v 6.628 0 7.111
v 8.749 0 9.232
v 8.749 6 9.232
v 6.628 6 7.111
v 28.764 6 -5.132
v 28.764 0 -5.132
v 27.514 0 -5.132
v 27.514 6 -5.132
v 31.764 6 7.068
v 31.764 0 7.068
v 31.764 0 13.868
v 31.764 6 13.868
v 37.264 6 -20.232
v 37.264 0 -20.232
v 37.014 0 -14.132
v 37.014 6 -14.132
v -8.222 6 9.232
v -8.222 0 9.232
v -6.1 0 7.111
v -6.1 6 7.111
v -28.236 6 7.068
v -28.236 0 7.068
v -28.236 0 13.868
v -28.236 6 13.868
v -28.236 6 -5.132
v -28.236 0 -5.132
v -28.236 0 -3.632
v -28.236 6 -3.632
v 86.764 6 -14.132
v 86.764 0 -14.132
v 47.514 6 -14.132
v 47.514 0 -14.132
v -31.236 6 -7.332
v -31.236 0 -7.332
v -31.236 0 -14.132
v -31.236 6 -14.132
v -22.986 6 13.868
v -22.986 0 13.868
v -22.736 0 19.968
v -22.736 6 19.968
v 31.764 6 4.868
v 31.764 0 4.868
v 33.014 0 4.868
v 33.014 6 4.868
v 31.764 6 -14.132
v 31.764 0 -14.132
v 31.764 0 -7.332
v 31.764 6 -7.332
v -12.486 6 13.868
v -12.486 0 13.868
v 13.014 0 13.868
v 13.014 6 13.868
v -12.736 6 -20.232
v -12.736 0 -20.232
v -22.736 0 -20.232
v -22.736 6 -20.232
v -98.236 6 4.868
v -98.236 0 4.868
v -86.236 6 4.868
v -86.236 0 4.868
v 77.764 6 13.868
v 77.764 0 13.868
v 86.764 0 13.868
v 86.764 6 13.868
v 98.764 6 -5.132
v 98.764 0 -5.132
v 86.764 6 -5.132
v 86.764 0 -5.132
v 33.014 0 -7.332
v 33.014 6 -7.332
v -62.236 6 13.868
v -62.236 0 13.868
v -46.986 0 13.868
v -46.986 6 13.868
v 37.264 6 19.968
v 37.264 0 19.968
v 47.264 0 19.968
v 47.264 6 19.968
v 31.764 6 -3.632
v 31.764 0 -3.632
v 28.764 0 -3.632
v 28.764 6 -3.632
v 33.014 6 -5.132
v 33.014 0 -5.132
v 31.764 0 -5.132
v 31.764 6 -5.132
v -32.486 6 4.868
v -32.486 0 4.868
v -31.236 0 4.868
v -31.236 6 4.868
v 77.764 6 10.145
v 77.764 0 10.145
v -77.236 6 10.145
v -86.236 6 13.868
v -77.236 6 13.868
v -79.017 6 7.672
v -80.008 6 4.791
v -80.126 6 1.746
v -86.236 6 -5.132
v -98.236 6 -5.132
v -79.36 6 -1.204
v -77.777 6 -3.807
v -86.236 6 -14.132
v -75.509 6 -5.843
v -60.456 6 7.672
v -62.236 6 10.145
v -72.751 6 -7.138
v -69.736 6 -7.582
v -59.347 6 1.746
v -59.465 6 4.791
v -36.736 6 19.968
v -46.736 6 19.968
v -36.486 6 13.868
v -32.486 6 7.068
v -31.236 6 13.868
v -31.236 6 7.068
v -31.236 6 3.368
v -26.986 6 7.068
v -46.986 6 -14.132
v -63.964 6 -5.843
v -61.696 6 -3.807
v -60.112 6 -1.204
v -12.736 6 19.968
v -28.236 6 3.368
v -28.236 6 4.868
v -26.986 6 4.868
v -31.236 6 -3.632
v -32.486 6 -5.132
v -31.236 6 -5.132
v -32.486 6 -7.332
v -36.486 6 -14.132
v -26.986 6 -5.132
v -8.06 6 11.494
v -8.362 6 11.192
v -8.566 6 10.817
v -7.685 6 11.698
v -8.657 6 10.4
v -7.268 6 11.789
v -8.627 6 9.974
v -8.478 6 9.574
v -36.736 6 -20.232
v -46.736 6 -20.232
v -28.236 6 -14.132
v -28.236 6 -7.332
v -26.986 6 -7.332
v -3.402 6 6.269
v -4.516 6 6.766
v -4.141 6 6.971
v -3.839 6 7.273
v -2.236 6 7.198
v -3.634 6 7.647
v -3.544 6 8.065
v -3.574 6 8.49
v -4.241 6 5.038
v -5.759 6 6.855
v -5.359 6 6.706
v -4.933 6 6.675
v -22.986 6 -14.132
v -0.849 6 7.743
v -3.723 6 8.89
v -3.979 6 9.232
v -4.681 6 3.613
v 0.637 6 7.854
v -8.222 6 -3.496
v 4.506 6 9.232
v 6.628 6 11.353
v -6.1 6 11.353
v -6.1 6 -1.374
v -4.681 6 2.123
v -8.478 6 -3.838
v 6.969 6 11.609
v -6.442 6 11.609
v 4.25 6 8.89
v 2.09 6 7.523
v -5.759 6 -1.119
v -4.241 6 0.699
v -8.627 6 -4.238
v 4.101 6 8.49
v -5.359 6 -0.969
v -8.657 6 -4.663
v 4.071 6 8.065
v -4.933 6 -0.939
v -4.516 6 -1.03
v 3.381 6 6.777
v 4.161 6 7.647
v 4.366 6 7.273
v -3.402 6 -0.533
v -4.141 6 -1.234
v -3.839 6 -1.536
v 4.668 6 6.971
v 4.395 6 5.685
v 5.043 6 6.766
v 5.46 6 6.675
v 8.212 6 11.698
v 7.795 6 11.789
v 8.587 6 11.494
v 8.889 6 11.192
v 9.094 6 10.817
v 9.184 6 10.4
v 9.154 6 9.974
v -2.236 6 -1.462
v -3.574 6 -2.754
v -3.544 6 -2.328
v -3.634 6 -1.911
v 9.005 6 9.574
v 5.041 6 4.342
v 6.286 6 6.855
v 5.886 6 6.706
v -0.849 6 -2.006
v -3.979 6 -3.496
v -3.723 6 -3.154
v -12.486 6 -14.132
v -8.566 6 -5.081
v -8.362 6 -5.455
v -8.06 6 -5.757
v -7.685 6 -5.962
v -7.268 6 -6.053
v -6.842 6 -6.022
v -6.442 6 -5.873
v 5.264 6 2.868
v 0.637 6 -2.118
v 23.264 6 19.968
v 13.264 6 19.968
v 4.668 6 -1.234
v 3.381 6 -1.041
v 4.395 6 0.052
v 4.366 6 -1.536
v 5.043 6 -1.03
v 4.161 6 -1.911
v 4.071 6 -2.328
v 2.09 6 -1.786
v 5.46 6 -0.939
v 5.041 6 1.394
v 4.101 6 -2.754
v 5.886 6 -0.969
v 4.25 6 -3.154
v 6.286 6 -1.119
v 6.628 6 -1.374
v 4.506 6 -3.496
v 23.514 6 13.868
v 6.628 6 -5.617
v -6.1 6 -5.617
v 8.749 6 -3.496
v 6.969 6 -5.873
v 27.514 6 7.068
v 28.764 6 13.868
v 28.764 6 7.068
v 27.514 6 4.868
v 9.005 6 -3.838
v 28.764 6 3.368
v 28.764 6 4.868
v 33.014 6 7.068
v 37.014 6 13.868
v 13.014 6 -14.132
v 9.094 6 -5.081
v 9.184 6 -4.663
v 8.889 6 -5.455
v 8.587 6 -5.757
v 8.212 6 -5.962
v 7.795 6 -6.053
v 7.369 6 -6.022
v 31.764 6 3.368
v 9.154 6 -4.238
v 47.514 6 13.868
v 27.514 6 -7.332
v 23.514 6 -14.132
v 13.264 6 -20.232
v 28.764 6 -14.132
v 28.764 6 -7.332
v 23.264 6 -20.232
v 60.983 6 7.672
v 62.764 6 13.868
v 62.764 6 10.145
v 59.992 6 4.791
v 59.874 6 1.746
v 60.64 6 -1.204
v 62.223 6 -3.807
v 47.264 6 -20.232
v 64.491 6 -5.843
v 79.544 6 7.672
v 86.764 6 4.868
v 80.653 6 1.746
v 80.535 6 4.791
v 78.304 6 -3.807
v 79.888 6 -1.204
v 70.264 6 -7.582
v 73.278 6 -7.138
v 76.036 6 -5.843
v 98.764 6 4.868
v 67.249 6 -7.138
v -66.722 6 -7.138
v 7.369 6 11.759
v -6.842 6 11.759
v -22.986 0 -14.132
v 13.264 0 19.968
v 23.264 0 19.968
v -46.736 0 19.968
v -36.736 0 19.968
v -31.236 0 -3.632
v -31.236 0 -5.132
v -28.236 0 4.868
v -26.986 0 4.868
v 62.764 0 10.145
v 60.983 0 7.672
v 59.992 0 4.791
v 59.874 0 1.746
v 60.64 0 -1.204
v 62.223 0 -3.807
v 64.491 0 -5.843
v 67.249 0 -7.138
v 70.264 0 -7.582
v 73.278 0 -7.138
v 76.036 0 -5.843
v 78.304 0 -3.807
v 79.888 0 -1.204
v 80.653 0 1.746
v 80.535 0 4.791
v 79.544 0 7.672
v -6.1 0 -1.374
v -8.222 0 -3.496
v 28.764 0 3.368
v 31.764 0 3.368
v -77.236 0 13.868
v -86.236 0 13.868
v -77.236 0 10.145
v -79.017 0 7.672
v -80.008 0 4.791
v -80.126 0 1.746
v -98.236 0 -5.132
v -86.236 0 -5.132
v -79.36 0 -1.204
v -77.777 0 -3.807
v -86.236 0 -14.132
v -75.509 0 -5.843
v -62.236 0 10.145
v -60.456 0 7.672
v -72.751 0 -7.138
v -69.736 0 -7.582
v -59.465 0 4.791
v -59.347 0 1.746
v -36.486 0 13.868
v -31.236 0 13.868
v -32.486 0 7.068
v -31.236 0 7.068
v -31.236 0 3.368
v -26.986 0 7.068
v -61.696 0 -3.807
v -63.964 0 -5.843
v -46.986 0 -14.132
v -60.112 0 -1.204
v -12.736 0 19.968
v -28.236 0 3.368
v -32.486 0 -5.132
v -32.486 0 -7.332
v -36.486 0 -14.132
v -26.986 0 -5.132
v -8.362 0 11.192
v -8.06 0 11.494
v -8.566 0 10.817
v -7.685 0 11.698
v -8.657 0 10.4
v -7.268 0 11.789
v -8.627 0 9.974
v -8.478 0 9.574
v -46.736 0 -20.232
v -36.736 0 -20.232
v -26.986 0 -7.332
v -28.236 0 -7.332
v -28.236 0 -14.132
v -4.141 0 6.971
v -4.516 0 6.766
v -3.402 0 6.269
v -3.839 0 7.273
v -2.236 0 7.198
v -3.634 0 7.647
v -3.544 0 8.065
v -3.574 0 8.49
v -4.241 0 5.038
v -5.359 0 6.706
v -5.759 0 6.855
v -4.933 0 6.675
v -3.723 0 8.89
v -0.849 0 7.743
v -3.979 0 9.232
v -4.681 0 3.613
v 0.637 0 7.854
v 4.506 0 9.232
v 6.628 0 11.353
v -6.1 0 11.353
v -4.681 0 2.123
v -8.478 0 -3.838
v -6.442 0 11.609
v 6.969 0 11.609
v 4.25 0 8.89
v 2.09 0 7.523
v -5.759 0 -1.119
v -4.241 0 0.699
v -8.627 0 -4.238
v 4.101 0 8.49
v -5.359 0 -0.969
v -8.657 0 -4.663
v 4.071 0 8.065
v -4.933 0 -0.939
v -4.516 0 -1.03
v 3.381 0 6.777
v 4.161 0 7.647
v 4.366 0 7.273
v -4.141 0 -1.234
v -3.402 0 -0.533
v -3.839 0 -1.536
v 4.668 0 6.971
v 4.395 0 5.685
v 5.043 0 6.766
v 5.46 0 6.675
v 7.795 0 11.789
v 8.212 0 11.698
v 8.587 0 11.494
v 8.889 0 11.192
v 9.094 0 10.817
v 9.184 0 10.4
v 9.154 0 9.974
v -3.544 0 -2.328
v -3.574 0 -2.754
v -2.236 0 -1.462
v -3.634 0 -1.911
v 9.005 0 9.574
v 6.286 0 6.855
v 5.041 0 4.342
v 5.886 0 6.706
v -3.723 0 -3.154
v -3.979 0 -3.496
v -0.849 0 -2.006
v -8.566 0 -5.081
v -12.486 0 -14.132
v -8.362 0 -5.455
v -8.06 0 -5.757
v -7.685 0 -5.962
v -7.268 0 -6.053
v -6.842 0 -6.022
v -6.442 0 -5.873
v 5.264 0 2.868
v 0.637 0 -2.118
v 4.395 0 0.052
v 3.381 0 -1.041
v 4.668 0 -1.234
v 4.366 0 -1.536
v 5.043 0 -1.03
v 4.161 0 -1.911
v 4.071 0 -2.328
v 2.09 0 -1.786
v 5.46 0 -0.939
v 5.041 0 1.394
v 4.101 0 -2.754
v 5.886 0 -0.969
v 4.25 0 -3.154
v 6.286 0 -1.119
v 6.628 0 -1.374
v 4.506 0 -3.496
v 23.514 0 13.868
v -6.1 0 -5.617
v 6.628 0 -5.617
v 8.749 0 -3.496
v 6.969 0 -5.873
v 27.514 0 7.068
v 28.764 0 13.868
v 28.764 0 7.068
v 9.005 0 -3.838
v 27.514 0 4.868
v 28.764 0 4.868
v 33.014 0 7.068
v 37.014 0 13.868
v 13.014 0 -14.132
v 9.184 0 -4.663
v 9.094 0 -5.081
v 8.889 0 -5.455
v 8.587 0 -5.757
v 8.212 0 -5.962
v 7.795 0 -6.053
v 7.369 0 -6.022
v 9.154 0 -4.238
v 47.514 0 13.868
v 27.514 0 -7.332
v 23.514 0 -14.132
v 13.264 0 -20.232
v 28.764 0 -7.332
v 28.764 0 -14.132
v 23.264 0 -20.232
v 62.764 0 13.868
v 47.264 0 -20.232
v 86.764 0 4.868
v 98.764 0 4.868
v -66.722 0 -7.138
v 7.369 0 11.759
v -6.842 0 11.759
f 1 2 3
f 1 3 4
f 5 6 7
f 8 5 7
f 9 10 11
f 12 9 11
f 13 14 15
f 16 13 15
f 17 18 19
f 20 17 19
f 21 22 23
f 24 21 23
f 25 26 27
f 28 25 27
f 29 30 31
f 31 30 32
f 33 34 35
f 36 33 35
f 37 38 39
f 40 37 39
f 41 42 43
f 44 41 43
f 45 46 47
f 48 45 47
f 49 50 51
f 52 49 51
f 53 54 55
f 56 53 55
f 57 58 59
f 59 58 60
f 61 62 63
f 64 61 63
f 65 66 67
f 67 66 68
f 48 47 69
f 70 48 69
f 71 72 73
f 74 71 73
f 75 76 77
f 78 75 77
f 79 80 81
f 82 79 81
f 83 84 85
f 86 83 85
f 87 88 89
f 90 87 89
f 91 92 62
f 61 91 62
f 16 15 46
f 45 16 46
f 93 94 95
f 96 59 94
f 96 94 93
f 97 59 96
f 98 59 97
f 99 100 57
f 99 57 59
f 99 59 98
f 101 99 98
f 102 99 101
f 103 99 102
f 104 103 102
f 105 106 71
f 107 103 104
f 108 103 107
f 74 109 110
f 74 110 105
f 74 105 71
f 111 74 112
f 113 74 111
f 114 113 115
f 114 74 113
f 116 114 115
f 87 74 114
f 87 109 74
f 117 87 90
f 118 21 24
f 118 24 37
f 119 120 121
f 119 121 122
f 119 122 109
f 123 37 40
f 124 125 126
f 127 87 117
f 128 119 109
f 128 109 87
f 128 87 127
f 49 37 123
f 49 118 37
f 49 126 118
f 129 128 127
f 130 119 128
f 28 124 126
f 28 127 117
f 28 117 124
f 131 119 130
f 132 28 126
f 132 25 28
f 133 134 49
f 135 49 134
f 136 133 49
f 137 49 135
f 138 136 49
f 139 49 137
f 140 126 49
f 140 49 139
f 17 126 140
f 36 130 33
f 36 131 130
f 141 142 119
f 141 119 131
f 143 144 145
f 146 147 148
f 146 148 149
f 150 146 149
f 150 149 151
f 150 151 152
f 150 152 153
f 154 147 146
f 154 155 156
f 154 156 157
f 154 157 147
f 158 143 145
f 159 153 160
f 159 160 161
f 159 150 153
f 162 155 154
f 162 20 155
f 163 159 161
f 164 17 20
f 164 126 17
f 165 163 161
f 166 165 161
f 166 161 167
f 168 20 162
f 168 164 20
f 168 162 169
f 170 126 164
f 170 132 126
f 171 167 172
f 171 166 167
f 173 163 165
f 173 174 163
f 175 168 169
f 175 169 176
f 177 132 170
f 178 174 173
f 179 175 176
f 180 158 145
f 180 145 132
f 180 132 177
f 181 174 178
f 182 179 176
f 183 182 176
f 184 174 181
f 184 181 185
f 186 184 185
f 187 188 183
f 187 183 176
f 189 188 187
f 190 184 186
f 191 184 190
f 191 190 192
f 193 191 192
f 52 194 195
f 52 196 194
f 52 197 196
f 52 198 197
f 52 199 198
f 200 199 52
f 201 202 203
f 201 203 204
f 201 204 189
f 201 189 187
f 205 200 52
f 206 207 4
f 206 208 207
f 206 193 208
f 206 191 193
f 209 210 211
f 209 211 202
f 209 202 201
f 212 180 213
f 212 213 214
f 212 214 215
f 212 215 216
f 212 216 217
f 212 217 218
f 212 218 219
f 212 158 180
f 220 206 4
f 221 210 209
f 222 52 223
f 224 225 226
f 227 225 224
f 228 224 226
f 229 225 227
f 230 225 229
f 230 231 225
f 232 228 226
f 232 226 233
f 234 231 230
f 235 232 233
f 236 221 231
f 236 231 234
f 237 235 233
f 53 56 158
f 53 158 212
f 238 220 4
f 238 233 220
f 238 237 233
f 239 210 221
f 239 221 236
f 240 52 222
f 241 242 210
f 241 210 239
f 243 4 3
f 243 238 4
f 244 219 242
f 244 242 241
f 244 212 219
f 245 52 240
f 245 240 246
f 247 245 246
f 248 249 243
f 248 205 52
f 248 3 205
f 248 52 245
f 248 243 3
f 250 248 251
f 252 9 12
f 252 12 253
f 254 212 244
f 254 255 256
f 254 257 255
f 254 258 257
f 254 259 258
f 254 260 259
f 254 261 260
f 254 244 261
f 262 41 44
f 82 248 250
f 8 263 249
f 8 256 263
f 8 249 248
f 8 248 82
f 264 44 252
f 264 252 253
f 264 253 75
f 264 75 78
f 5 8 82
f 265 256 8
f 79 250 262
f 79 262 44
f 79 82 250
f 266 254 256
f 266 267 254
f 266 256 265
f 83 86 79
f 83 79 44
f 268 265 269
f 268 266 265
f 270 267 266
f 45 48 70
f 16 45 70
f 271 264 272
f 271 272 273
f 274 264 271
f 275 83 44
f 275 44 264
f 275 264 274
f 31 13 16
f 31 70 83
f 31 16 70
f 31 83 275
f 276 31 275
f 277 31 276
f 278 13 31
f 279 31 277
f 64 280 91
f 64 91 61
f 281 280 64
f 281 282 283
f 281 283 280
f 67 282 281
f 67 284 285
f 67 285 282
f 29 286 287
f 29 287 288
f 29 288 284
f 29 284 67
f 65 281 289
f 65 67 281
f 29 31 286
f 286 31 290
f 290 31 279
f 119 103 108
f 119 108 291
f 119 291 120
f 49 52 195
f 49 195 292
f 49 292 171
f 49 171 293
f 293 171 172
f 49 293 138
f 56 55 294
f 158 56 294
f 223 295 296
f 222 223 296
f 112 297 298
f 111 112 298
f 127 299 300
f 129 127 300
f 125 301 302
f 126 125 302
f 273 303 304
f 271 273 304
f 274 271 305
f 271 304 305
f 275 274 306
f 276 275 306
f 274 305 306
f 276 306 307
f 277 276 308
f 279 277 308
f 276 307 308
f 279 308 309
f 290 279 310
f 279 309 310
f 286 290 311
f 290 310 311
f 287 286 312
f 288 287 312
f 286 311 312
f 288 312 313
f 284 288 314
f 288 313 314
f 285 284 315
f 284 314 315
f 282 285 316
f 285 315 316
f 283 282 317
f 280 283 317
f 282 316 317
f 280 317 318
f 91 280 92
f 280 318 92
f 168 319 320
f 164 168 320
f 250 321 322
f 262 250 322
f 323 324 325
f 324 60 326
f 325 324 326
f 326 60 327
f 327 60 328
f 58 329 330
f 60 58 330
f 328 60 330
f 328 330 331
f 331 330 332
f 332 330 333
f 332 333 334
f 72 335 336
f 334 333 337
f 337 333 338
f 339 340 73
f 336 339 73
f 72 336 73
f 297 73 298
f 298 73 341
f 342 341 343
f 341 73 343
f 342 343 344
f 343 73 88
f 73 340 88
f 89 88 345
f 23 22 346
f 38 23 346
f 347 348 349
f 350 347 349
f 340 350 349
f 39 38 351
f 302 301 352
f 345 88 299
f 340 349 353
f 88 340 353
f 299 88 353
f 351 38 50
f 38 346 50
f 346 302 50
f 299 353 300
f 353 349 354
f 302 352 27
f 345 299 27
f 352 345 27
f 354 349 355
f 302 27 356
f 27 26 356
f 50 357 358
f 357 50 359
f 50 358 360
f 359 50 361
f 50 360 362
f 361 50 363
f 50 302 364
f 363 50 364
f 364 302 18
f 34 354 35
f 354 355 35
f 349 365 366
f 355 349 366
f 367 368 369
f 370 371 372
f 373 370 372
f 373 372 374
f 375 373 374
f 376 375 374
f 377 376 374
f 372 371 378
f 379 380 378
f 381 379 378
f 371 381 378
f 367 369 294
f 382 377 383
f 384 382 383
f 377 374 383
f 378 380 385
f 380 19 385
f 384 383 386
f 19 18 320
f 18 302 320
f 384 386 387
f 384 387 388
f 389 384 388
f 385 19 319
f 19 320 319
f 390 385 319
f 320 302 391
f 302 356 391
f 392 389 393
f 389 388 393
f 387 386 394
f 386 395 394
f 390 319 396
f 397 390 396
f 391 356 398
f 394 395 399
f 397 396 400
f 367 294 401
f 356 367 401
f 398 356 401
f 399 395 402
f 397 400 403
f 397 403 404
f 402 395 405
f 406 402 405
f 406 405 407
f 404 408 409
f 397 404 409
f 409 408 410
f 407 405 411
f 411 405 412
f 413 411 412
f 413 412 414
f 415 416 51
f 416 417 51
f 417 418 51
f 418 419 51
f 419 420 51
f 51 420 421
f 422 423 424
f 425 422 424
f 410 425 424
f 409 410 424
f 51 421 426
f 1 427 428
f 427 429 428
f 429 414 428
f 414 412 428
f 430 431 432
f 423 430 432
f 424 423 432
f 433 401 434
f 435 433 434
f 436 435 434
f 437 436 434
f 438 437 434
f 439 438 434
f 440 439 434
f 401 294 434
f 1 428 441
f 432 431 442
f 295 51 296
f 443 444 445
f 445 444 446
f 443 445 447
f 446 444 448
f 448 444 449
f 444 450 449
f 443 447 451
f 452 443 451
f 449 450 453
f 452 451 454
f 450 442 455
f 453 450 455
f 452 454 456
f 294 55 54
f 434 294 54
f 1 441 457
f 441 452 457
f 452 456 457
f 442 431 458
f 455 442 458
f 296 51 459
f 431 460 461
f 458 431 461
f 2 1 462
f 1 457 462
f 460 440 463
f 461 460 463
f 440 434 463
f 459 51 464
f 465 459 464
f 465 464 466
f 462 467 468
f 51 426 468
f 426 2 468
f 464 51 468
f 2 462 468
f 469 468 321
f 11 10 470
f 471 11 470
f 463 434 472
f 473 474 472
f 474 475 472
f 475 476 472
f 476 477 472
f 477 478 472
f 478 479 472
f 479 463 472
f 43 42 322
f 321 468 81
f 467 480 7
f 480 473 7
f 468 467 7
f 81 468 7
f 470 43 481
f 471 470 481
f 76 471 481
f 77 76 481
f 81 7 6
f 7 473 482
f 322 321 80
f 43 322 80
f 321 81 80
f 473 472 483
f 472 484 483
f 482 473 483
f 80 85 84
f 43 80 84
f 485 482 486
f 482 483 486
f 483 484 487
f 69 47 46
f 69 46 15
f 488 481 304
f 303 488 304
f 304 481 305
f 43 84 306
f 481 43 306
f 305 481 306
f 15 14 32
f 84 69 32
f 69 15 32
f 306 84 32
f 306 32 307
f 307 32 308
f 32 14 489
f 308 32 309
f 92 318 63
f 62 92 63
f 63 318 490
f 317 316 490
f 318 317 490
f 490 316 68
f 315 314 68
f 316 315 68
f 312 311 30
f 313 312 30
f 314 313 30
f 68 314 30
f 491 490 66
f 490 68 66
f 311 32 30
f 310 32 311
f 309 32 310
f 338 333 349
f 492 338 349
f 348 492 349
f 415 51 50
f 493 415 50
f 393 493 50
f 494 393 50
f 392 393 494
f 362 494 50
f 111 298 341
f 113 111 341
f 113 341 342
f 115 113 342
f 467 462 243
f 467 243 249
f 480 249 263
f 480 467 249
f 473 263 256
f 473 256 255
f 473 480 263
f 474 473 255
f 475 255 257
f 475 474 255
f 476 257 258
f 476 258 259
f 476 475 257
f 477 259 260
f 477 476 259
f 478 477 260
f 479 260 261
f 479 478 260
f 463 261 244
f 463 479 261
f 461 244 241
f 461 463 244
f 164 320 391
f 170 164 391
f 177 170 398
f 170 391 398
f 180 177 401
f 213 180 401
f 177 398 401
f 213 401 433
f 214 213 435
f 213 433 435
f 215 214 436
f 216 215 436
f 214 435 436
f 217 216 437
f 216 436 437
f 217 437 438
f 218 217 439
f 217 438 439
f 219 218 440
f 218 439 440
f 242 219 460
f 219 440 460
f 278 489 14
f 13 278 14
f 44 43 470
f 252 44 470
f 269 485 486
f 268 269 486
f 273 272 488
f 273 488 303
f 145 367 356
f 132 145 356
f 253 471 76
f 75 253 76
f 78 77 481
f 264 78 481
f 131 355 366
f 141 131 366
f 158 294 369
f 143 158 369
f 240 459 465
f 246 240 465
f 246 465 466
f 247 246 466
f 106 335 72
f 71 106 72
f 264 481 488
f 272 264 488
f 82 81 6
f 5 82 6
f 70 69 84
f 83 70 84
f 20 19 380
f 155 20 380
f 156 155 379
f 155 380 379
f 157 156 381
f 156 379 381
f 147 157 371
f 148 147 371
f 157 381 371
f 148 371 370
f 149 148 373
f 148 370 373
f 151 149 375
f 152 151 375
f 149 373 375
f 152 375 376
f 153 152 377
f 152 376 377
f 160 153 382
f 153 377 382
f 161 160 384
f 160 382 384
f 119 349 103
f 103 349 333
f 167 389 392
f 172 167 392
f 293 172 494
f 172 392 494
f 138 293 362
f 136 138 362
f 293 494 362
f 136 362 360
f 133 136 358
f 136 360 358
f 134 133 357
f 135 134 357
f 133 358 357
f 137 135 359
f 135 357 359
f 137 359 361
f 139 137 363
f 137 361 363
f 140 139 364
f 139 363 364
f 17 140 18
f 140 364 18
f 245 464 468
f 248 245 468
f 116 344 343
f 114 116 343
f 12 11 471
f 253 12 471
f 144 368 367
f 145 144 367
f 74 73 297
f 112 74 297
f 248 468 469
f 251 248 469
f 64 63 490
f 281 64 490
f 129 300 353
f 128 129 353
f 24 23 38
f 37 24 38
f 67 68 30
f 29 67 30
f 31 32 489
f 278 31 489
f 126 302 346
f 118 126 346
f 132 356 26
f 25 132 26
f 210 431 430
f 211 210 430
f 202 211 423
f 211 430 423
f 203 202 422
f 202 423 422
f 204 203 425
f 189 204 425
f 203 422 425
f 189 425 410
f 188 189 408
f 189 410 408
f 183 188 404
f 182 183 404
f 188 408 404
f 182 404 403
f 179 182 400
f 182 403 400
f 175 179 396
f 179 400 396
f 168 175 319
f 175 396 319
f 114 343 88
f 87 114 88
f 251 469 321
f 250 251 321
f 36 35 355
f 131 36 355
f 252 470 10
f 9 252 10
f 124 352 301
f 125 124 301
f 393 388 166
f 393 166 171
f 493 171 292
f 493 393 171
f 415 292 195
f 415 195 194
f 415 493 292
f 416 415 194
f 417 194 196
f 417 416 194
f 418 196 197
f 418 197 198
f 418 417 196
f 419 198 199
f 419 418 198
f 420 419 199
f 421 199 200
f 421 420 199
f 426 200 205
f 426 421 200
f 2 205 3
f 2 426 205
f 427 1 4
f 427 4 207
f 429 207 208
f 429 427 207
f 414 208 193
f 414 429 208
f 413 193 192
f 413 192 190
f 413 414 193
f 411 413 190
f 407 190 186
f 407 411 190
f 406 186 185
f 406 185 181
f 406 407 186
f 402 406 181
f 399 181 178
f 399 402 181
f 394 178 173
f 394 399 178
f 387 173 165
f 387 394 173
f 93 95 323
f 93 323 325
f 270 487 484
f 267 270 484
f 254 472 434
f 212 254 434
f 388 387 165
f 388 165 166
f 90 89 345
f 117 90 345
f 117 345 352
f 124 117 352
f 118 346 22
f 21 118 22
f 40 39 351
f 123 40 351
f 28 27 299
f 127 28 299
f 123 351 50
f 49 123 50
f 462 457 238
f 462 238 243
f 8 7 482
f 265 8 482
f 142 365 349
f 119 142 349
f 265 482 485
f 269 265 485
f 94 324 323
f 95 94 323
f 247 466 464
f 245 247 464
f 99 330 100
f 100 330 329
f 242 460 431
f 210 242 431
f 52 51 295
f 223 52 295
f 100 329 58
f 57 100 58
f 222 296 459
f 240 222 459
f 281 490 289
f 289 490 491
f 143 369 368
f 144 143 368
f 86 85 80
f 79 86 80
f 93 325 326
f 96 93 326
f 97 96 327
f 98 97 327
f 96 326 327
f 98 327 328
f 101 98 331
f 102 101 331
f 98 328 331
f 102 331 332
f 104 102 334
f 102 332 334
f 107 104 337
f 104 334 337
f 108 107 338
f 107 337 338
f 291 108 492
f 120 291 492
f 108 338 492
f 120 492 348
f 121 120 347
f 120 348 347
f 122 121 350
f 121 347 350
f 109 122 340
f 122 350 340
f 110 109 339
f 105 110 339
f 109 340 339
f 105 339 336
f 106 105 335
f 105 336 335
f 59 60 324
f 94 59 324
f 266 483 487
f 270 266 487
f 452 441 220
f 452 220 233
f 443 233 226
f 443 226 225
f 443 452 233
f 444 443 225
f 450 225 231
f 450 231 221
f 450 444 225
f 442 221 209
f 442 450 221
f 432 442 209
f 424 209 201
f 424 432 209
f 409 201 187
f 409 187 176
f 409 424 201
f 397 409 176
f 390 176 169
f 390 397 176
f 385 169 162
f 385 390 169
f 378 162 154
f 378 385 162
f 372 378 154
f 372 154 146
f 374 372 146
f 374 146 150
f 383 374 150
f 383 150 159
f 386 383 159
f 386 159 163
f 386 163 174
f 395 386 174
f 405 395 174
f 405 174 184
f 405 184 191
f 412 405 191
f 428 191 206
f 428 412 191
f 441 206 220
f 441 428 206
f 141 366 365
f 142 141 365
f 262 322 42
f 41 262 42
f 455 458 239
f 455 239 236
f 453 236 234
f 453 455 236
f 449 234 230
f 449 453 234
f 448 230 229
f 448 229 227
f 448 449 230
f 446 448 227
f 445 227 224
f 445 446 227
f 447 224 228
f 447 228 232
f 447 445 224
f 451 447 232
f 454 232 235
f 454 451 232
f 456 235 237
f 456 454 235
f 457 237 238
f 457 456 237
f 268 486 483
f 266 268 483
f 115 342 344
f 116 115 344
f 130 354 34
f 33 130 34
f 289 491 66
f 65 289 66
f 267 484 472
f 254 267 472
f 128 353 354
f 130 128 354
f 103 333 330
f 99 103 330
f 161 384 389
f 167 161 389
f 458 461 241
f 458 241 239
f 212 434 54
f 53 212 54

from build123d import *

# Parameters (mm, degrees)
SKETCH_1_R      = 5
EXTRUDE_1_DEPTH = 6


with BuildPart() as part:
    # Эскиз1 → Бобышка-Вытянуть1 (new body)
    with BuildSketch(Plane(origin=(0, 0, 0), x_dir=(1, 0, 0), z_dir=(0, 1, 0))):
        with BuildLine():
            Line((86.763576424, -13.868211788), (86.763576424, -4.868211788))
            Line((86.763576424, -4.868211788), (98.763576424, -4.868211788))
            Line((98.763576424, -4.868211788), (98.763576424, 5.131788212))
            Line((98.763576424, 5.131788212), (86.763576424, 5.131788212))
            Line((86.763576424, 5.131788212), (86.763576424, 14.131788212))
            Line((86.763576424, 14.131788212), (47.513576424, 14.131788212))
            Line((47.513576424, 14.131788212), (47.263576424, 20.231788212))
            Line((47.263576424, 20.231788212), (37.263576424, 20.231788212))
            Line((37.263576424, 20.231788212), (37.013576424, 14.131788212))
            Line((37.013576424, 14.131788212), (31.763576424, 14.131788212))
            Line((31.763576424, 14.131788212), (31.763576424, 7.331788212))
            Line((31.763576424, 7.331788212), (33.013576424, 7.331788212))
            Line((33.013576424, 7.331788212), (33.013576424, 5.131788212))
            Line((33.013576424, 5.131788212), (31.763576424, 5.131788212))
            Line((31.763576424, 5.131788212), (31.763576424, 3.631788212))
            Line((31.763576424, 3.631788212), (28.763576424, 3.631788212))
            Line((28.763576424, 3.631788212), (28.763576424, 5.131788212))
            Line((28.763576424, 5.131788212), (27.513576424, 5.131788212))
            Line((27.513576424, 5.131788212), (27.513576424, 7.331788212))
            Line((27.513576424, 7.331788212), (28.763576424, 7.331788212))
            Line((28.763576424, 7.331788212), (28.763576424, 14.131788212))
            Line((28.763576424, 14.131788212), (23.513576424, 14.131788212))
            Line((23.513576424, 14.131788212), (23.263576424, 20.231788212))
            Line((23.263576424, 20.231788212), (13.263576424, 20.231788212))
            Line((13.263576424, 20.231788212), (13.013576424, 14.131788212))
            Line((13.013576424, 14.131788212), (-12.486423576, 14.131788212))
            Line((-12.486423576, 14.131788212), (-12.736423576, 20.231788212))
            Line((-12.736423576, 20.231788212), (-22.736423576, 20.231788212))
            Line((-22.736423576, 20.231788212), (-22.986423576, 14.131788212))
            Line((-22.986423576, 14.131788212), (-28.236423576, 14.131788212))
            Line((-28.236423576, 14.131788212), (-28.236423576, 7.331788212))
            Line((-28.236423576, 7.331788212), (-26.986423576, 7.331788212))
            Line((-26.986423576, 7.331788212), (-26.986423576, 5.131788212))
            Line((-26.986423576, 5.131788212), (-28.236423576, 5.131788212))
            Line((-28.236423576, 5.131788212), (-28.236423576, 3.631788212))
            Line((-28.236423576, 3.631788212), (-31.236423576, 3.631788212))
            Line((-31.236423576, 3.631788212), (-31.236423576, 5.131788212))
            Line((-31.236423576, 5.131788212), (-32.486423576, 5.131788212))
            Line((-32.486423576, 5.131788212), (-32.486423576, 7.331788212))
            Line((-32.486423576, 7.331788212), (-31.236423576, 7.331788212))
            Line((-31.236423576, 7.331788212), (-31.236423576, 14.131788212))
            Line((-31.236423576, 14.131788212), (-36.486423576, 14.131788212))
            Line((-36.486423576, 14.131788212), (-36.736423576, 20.231788212))
            Line((-36.736423576, 20.231788212), (-46.736423576, 20.231788212))
            Line((-46.736423576, 20.231788212), (-46.986423576, 14.131788212))
            Line((-46.986423576, 14.131788212), (-86.236423576, 14.131788212))
            Line((-86.236423576, 14.131788212), (-86.236423576, 5.131788212))
            Line((-86.236423576, 5.131788212), (-98.236423576, 5.131788212))
            Line((-98.236423576, 5.131788212), (-98.236423576, -4.868211788))
            Line((-98.236423576, -4.868211788), (-86.236423576, -4.868211788))
            Line((-86.236423576, -4.868211788), (-86.236423576, -13.868211788))
            Line((-86.236423576, -13.868211788), (-77.236423576, -13.868211788))
            Line((-77.236423576, -13.868211788), (-77.236423576, -10.145058633))
            ThreePointArc((-77.236423576, -10.145058633), (-69.736423576, 7.581788212), (-62.236423576, -10.145058633))
            Line((-62.236423576, -10.145058633), (-62.236423576, -13.868211788))
            Line((-62.236423576, -13.868211788), (-46.986423576, -13.868211788))
            Line((-46.986423576, -13.868211788), (-46.736423576, -19.968211788))
            Line((-46.736423576, -19.968211788), (-36.736423576, -19.968211788))
            Line((-36.736423576, -19.968211788), (-36.486423576, -13.868211788))
            Line((-36.486423576, -13.868211788), (-31.236423576, -13.868211788))
            Line((-31.236423576, -13.868211788), (-31.236423576, -7.068211788))
            Line((-31.236423576, -7.068211788), (-32.486423576, -7.068211788))
            Line((-32.486423576, -7.068211788), (-32.486423576, -4.868211788))
            Line((-32.486423576, -4.868211788), (-31.236423576, -4.868211788))
            Line((-31.236423576, -4.868211788), (-31.236423576, -3.368211788))
            Line((-31.236423576, -3.368211788), (-28.236423576, -3.368211788))
            Line((-28.236423576, -3.368211788), (-28.236423576, -4.868211788))
            Line((-28.236423576, -4.868211788), (-26.986423576, -4.868211788))
            Line((-26.986423576, -4.868211788), (-26.986423576, -7.068211788))
            Line((-26.986423576, -7.068211788), (-28.236423576, -7.068211788))
            Line((-28.236423576, -7.068211788), (-28.236423576, -13.868211788))
            Line((-28.236423576, -13.868211788), (-22.986423576, -13.868211788))
            Line((-22.986423576, -13.868211788), (-22.736423576, -19.968211788))
            Line((-22.736423576, -19.968211788), (-12.736423576, -19.968211788))
            Line((-12.736423576, -19.968211788), (-12.486423576, -13.868211788))
            Line((-12.486423576, -13.868211788), (13.013576424, -13.868211788))
            Line((13.013576424, -13.868211788), (13.263576424, -19.968211788))
            Line((13.263576424, -19.968211788), (23.263576424, -19.968211788))
            Line((23.263576424, -19.968211788), (23.513576424, -13.868211788))
            Line((23.513576424, -13.868211788), (28.763576424, -13.868211788))
            Line((28.763576424, -13.868211788), (28.763576424, -7.068211788))
            Line((28.763576424, -7.068211788), (27.513576424, -7.068211788))
            Line((27.513576424, -7.068211788), (27.513576424, -4.868211788))
            Line((27.513576424, -4.868211788), (28.763576424, -4.868211788))
            Line((28.763576424, -4.868211788), (28.763576424, -3.368211788))
            Line((28.763576424, -3.368211788), (31.763576424, -3.368211788))
            Line((31.763576424, -3.368211788), (31.763576424, -4.868211788))
            Line((31.763576424, -4.868211788), (33.013576424, -4.868211788))
            Line((33.013576424, -4.868211788), (33.013576424, -7.068211788))
            Line((33.013576424, -7.068211788), (31.763576424, -7.068211788))
            Line((31.763576424, -7.068211788), (31.763576424, -13.868211788))
            Line((31.763576424, -13.868211788), (37.013576424, -13.868211788))
            Line((37.013576424, -13.868211788), (37.263576424, -19.968211788))
            Line((37.263576424, -19.968211788), (47.263576424, -19.968211788))
            Line((47.263576424, -19.968211788), (47.513576424, -13.868211788))
            Line((47.513576424, -13.868211788), (62.763576424, -13.868211788))
            Line((62.763576424, -13.868211788), (62.763576424, -10.145058633))
            ThreePointArc((62.763576424, -10.145058633), (70.263576424, 7.581788212), (77.763576424, -10.145058633))
            Line((77.763576424, -10.145058633), (77.763576424, -13.868211788))
            Line((77.763576424, -13.868211788), (86.763576424, -13.868211788))
        make_face()
        with Locations((0.263576424, -2.868211788)):
            Circle(SKETCH_1_R, mode=Mode.SUBTRACT)
        with BuildLine():
            Line((-8.221704951, -9.232172819), (-6.100384607, -7.110852475))
            ThreePointArc((-6.100384607, -7.110852475), (-3.979064264, -7.110852475), (-3.979064264, -9.232172819))
            Line((-3.979064264, -9.232172819), (-6.100384607, -11.353493162))
            ThreePointArc((-6.100384607, -11.353493162), (-8.221704951, -11.353493162), (-8.221704951, -9.232172819))
        make_face(mode=Mode.SUBTRACT)
        with BuildLine():
            Line((-6.100384607, 5.617069586), (-3.979064264, 3.495749242))
            ThreePointArc((-3.979064264, 3.495749242), (-3.979064264, 1.374428899), (-6.100384607, 1.374428899))
            Line((-6.100384607, 1.374428899), (-8.221704951, 3.495749242))
            ThreePointArc((-8.221704951, 3.495749242), (-8.221704951, 5.617069586), (-6.100384607, 5.617069586))
        make_face(mode=Mode.SUBTRACT)
        with BuildLine():
            Line((8.748857798, -9.232172819), (6.627537454, -7.110852475))
            ThreePointArc((6.627537454, -7.110852475), (4.506217111, -7.110852475), (4.506217111, -9.232172819))
            Line((4.506217111, -9.232172819), (6.627537454, -11.353493162))
            ThreePointArc((6.627537454, -11.353493162), (8.748857798, -11.353493162), (8.748857798, -9.232172819))
        make_face(mode=Mode.SUBTRACT)
        with BuildLine():
            Line((6.627537454, 5.617069586), (4.506217111, 3.495749242))
            ThreePointArc((4.506217111, 3.495749242), (4.506217111, 1.374428899), (6.627537454, 1.374428899))
            Line((6.627537454, 1.374428899), (8.748857798, 3.495749243))
            ThreePointArc((8.748857798, 3.495749243), (8.748857798, 5.617069586), (6.627537454, 5.617069586))
        make_face(mode=Mode.SUBTRACT)
    extrude(amount=EXTRUDE_1_DEPTH)


solid = part.part
